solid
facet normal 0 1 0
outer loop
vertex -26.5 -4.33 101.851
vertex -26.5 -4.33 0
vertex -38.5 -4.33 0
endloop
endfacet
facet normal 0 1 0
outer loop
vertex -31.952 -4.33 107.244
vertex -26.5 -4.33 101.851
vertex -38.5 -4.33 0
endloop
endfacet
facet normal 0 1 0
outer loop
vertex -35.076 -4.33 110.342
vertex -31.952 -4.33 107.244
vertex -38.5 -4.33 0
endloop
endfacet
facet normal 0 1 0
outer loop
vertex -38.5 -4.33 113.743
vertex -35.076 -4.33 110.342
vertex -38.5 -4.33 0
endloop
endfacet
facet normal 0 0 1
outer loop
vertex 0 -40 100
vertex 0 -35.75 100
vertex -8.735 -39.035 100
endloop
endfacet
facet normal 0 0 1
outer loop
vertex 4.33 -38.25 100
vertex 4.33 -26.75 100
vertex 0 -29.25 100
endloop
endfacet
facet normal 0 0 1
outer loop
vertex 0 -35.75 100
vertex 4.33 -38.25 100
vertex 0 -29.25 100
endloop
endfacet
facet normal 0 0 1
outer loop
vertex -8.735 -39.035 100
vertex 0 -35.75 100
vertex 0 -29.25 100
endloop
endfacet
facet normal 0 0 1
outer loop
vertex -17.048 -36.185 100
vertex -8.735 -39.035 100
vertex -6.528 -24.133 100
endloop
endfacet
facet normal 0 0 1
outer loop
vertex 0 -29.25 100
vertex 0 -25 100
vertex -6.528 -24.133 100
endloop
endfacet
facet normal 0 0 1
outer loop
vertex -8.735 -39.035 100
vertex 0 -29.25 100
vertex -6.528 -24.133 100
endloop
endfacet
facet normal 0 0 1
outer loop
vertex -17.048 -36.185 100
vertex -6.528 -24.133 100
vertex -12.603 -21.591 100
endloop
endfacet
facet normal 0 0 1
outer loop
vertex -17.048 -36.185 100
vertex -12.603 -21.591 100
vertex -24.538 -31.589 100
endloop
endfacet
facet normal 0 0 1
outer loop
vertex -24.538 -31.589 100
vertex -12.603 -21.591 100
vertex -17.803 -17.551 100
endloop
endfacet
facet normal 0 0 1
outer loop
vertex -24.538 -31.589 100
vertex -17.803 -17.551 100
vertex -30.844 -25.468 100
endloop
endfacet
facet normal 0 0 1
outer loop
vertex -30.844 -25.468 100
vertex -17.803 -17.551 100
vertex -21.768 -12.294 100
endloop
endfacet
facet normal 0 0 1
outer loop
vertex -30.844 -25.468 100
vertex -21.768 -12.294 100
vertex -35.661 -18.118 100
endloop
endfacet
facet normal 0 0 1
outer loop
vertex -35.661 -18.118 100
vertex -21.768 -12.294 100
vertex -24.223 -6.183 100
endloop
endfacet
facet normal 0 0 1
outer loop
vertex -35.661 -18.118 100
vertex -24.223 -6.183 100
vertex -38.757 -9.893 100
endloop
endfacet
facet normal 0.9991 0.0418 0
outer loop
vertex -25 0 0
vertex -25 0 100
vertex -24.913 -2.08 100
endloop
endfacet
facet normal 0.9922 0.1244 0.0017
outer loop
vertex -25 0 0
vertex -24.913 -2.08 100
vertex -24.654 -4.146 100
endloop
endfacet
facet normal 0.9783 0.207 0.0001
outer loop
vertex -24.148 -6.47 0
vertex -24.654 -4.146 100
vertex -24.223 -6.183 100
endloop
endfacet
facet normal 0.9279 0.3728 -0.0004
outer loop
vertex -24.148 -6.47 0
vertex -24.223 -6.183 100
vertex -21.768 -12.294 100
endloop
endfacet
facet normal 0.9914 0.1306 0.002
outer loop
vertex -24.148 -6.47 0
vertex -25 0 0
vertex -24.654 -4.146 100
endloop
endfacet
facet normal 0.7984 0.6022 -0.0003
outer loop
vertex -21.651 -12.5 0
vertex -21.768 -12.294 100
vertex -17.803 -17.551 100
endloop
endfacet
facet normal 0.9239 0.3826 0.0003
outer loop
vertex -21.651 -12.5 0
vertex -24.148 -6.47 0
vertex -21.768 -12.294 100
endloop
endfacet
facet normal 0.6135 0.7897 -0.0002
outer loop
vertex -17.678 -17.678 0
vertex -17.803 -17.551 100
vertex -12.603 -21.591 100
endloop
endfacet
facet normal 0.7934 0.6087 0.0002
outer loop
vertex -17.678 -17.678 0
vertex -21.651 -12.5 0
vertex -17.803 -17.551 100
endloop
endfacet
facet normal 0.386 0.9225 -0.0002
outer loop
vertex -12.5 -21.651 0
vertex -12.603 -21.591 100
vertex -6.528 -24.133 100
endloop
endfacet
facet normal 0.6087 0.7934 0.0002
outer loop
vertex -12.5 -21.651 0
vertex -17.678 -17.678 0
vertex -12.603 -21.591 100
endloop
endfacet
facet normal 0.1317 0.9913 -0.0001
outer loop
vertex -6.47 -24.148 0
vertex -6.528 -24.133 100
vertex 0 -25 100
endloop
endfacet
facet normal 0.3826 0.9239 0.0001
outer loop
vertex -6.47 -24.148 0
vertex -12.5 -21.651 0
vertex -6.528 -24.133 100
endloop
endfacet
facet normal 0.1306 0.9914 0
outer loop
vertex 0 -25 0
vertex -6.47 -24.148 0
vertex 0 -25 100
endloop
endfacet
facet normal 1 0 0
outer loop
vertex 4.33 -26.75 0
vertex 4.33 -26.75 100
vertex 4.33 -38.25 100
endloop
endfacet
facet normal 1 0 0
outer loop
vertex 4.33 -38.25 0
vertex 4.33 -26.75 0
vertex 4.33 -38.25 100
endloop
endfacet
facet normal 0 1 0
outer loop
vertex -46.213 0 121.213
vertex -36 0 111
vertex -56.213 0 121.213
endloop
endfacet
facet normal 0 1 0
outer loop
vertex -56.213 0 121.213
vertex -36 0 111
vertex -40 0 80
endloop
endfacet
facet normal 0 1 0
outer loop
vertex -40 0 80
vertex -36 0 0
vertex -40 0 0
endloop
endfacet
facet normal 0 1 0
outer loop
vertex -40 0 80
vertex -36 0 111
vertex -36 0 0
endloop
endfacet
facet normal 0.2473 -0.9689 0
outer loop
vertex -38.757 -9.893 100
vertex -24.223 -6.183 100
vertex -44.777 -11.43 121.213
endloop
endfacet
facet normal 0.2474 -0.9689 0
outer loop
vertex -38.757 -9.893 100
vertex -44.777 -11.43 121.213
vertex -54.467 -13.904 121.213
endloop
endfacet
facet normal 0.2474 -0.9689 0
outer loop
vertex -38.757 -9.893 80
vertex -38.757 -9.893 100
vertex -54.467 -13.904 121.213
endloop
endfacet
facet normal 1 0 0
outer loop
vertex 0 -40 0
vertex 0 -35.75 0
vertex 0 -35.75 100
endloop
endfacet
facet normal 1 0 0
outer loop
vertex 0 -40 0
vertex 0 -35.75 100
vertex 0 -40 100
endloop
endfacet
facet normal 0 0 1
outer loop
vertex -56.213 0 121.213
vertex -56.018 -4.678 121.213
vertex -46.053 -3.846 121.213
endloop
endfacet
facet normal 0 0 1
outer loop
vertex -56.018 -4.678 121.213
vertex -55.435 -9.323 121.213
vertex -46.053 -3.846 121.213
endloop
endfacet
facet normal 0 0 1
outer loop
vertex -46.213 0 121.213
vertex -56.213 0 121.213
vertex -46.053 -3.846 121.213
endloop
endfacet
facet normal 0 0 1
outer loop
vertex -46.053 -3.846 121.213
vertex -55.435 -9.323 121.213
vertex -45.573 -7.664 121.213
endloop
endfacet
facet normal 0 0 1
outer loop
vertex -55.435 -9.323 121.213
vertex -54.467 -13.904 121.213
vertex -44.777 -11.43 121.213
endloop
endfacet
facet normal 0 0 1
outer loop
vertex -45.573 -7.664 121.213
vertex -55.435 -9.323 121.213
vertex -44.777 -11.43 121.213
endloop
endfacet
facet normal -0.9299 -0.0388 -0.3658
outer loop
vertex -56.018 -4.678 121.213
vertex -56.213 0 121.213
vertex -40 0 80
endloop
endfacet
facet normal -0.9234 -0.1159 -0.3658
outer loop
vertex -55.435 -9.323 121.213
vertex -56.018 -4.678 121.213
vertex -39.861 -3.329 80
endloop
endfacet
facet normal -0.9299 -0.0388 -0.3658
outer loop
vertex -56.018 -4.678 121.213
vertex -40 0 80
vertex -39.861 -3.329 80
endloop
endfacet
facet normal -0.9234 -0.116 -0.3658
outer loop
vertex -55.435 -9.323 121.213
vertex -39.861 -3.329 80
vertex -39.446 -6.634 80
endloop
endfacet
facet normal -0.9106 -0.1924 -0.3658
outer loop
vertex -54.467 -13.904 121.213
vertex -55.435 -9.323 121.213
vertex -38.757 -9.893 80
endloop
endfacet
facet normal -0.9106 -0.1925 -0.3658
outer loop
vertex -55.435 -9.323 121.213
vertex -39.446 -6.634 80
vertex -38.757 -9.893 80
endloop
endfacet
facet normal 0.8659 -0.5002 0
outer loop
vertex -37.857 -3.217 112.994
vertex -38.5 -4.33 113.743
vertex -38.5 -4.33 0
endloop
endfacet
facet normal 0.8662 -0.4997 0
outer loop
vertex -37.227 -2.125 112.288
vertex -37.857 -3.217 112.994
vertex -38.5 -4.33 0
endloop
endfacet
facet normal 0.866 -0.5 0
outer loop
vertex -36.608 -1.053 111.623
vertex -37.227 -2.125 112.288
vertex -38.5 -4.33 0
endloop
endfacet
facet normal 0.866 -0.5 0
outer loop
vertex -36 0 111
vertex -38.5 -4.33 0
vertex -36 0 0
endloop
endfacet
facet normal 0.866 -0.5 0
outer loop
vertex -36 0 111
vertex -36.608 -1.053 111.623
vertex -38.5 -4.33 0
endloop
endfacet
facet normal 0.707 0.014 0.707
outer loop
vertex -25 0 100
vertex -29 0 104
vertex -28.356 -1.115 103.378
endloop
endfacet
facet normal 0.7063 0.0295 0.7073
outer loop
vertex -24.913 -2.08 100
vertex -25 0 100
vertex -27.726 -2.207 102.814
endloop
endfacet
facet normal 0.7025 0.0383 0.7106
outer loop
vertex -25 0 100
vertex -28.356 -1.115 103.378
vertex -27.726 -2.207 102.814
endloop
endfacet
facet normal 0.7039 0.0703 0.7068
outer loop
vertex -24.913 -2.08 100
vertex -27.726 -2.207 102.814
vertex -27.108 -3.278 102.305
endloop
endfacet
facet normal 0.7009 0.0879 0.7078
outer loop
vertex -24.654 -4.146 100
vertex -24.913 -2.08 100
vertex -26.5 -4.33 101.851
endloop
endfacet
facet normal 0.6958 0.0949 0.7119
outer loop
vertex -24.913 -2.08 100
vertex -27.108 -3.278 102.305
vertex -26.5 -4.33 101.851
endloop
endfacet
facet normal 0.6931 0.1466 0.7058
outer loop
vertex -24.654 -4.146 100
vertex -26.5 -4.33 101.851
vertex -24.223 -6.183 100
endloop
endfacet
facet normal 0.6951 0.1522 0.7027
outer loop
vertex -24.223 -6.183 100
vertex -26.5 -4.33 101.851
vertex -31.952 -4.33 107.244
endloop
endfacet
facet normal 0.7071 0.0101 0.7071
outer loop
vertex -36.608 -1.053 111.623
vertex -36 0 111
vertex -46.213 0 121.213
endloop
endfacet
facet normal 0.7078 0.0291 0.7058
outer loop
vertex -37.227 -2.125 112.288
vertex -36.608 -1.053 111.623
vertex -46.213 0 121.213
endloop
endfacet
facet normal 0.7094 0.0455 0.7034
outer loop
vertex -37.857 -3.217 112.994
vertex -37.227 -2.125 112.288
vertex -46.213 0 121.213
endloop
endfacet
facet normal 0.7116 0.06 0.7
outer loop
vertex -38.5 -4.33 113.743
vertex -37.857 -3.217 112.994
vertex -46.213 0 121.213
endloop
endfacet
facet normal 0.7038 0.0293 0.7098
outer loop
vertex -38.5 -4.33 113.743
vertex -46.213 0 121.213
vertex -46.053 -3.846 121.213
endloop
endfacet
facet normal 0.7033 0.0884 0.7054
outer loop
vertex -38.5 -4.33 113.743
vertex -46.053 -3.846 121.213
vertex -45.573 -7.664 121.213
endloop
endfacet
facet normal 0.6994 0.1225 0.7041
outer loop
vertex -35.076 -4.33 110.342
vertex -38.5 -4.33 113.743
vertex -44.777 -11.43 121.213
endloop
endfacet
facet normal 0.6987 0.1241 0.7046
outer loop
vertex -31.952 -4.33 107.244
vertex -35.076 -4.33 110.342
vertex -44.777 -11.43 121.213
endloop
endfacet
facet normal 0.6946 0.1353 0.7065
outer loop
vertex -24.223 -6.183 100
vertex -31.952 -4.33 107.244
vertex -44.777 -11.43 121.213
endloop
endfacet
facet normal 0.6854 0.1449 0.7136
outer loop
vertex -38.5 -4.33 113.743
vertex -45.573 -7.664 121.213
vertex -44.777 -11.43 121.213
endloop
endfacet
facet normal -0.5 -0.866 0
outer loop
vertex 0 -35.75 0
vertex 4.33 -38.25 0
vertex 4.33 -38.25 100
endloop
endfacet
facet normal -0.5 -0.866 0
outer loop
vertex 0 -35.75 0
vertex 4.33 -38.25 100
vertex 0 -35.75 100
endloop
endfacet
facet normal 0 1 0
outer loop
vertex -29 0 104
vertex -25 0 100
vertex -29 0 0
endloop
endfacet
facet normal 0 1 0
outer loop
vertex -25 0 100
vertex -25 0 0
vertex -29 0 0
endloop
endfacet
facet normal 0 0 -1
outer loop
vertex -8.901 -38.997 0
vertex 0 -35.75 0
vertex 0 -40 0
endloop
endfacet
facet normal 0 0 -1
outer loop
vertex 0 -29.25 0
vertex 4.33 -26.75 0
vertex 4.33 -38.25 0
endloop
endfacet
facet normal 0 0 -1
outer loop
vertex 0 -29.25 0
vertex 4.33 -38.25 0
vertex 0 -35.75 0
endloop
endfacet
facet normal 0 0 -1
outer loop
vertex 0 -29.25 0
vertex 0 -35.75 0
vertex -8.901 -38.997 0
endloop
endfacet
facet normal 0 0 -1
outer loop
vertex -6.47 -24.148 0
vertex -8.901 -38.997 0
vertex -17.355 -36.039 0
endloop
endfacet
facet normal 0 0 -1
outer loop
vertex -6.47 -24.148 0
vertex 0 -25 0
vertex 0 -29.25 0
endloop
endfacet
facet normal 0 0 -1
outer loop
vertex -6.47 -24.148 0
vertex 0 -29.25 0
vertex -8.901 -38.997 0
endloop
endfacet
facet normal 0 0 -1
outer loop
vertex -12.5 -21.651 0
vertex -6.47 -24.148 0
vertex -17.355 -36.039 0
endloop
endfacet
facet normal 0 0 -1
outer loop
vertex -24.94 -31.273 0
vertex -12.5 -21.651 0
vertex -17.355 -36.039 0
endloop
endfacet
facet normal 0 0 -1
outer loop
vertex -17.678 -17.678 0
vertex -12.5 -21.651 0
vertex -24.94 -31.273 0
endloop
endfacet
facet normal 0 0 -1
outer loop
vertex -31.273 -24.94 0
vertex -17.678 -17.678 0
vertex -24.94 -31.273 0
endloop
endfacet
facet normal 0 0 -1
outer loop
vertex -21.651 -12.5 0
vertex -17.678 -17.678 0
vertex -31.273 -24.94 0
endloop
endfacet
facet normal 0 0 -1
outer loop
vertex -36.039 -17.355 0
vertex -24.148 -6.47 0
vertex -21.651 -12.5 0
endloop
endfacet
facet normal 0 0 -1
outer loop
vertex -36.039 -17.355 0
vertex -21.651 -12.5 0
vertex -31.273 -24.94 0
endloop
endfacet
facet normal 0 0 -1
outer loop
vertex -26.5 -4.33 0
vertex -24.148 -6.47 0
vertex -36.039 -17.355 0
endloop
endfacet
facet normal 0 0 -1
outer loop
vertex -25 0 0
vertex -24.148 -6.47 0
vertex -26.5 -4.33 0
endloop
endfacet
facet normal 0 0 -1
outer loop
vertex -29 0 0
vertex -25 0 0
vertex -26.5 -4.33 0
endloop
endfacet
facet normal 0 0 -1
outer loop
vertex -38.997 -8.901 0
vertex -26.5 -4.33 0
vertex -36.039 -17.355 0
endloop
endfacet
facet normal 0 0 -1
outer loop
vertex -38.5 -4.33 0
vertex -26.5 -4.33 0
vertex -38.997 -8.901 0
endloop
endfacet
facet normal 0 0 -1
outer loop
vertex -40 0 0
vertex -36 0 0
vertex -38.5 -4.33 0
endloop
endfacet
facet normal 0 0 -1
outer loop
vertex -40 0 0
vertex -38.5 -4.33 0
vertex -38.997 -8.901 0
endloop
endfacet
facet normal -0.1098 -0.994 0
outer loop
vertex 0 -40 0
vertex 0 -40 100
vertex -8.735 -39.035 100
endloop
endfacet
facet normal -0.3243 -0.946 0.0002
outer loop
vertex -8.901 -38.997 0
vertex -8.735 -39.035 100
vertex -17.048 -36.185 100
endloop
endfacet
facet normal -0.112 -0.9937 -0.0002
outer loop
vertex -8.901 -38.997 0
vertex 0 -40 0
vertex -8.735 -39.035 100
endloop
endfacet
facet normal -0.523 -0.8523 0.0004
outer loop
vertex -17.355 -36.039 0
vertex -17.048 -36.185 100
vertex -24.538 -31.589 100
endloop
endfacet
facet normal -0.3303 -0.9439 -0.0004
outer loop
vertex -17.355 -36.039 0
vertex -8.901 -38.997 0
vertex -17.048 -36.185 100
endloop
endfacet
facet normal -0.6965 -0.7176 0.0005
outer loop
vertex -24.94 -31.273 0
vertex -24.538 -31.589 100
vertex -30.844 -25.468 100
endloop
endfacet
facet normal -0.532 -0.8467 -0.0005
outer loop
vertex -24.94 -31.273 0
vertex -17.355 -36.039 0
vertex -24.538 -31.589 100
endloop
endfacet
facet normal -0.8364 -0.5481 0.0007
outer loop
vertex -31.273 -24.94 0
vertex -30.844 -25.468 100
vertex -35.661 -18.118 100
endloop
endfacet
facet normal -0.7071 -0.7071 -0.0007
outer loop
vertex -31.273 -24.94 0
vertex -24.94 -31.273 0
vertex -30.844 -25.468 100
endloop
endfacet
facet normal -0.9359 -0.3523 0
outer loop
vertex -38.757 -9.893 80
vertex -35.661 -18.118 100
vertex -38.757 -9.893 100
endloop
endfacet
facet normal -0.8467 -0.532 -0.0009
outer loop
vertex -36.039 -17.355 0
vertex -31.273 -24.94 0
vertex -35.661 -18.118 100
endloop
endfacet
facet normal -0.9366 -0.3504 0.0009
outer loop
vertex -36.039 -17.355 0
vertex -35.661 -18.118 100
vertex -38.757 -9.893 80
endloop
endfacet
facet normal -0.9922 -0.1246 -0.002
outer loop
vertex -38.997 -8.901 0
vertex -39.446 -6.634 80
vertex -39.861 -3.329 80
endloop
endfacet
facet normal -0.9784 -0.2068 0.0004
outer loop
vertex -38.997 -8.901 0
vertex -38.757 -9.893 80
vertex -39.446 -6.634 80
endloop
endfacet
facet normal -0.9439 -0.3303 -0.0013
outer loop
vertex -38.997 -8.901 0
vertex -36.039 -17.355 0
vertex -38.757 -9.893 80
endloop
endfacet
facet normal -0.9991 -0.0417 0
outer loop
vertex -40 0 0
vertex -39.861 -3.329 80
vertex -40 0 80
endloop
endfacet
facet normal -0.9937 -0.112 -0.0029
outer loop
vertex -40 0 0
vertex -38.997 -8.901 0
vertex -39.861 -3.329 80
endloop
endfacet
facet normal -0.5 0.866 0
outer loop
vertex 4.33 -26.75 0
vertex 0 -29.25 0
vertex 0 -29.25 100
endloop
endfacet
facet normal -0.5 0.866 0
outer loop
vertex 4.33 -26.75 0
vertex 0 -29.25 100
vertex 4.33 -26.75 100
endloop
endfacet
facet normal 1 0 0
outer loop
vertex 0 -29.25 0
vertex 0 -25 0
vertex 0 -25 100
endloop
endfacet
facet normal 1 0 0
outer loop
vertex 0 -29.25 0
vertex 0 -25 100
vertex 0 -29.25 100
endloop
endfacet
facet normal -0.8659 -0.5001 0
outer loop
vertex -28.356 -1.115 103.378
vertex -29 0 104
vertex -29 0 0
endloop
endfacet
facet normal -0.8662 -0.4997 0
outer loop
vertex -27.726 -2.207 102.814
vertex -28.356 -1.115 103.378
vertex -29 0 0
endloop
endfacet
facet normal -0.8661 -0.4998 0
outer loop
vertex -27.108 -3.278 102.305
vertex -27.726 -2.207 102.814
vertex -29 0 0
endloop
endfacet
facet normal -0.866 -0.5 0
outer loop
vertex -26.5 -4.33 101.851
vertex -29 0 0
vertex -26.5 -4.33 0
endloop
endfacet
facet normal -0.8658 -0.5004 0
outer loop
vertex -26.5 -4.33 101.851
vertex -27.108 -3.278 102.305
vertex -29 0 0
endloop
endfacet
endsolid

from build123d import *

# Parameters (mm, degrees)
BOSS_EXTRUDE2_DEPTH     = 100
REVOLVE1_ANGLE          = 14.32
CUT_EXTRUDE2_DEPTH      = 140.472452218
CUT_EXTRUDE2_DEPTH_BACK = 140.472452218
BOSS_EXTRUDE4_DEPTH     = 100


with BuildPart() as part:
    # Sketch1 → Boss-Extrude2 (new body)
    with BuildSketch(Plane.XY):
        with BuildLine():
            Line((-40, 0), (-25, 0))
            ThreePointArc((-25, 0), (-17.67766953, -17.67766953), (0, -25))
            Line((0, -25), (0, -40))
            ThreePointArc((0, -40), (-28.284271247, -28.284271247), (-40, 0))
        make_face()
    extrude(amount=BOSS_EXTRUDE2_DEPTH)

    # Sketch2 → Revolve1 (revolve)
    with BuildSketch(Plane(origin=(0, 0, 0), x_dir=(1, 0, 0), z_dir=(0, 1, 0))):
        Polygon((-25, -100), (-46.213203436, -121.213203436), (-56.213203436, -121.213203436), (-40, -80), align=None)
    revolve(axis=Axis((0, 0, 0), (0, 0, 1)), revolution_arc=REVOLVE1_ANGLE)

    # Sketch4 → Cut-Extrude2 (cut, two sides: drawn at the far end of the back side and taken through both)
    with BuildSketch(Plane(origin=(0, 0, 0), x_dir=(-1, 0, 0), z_dir=(0, 0, -1)).offset(-CUT_EXTRUDE2_DEPTH_BACK)):
        Polygon((-98.13708499, 0), (25, 0), (29, 0), (26.5, -4.330127019), (38.5, -4.330127019), (36, 0), (40, 0), (163.13708499, 0), (163.13708499, 246.27416998), (-98.13708499, 246.27416998), align=None)
    extrude(amount=CUT_EXTRUDE2_DEPTH + CUT_EXTRUDE2_DEPTH_BACK, mode=Mode.SUBTRACT)

    # Sketch5 → Boss-Extrude4 (add)
    with BuildSketch(Plane(origin=(0, 0, 0), x_dir=(-1, 0, 0), z_dir=(0, 0, -1))):
        Polygon((0, -35.75), (0, -29.25), (-4.330127019, -26.75), (-4.330127019, -38.25), align=None)
    extrude(amount=-BOSS_EXTRUDE4_DEPTH)


solid = part.part
